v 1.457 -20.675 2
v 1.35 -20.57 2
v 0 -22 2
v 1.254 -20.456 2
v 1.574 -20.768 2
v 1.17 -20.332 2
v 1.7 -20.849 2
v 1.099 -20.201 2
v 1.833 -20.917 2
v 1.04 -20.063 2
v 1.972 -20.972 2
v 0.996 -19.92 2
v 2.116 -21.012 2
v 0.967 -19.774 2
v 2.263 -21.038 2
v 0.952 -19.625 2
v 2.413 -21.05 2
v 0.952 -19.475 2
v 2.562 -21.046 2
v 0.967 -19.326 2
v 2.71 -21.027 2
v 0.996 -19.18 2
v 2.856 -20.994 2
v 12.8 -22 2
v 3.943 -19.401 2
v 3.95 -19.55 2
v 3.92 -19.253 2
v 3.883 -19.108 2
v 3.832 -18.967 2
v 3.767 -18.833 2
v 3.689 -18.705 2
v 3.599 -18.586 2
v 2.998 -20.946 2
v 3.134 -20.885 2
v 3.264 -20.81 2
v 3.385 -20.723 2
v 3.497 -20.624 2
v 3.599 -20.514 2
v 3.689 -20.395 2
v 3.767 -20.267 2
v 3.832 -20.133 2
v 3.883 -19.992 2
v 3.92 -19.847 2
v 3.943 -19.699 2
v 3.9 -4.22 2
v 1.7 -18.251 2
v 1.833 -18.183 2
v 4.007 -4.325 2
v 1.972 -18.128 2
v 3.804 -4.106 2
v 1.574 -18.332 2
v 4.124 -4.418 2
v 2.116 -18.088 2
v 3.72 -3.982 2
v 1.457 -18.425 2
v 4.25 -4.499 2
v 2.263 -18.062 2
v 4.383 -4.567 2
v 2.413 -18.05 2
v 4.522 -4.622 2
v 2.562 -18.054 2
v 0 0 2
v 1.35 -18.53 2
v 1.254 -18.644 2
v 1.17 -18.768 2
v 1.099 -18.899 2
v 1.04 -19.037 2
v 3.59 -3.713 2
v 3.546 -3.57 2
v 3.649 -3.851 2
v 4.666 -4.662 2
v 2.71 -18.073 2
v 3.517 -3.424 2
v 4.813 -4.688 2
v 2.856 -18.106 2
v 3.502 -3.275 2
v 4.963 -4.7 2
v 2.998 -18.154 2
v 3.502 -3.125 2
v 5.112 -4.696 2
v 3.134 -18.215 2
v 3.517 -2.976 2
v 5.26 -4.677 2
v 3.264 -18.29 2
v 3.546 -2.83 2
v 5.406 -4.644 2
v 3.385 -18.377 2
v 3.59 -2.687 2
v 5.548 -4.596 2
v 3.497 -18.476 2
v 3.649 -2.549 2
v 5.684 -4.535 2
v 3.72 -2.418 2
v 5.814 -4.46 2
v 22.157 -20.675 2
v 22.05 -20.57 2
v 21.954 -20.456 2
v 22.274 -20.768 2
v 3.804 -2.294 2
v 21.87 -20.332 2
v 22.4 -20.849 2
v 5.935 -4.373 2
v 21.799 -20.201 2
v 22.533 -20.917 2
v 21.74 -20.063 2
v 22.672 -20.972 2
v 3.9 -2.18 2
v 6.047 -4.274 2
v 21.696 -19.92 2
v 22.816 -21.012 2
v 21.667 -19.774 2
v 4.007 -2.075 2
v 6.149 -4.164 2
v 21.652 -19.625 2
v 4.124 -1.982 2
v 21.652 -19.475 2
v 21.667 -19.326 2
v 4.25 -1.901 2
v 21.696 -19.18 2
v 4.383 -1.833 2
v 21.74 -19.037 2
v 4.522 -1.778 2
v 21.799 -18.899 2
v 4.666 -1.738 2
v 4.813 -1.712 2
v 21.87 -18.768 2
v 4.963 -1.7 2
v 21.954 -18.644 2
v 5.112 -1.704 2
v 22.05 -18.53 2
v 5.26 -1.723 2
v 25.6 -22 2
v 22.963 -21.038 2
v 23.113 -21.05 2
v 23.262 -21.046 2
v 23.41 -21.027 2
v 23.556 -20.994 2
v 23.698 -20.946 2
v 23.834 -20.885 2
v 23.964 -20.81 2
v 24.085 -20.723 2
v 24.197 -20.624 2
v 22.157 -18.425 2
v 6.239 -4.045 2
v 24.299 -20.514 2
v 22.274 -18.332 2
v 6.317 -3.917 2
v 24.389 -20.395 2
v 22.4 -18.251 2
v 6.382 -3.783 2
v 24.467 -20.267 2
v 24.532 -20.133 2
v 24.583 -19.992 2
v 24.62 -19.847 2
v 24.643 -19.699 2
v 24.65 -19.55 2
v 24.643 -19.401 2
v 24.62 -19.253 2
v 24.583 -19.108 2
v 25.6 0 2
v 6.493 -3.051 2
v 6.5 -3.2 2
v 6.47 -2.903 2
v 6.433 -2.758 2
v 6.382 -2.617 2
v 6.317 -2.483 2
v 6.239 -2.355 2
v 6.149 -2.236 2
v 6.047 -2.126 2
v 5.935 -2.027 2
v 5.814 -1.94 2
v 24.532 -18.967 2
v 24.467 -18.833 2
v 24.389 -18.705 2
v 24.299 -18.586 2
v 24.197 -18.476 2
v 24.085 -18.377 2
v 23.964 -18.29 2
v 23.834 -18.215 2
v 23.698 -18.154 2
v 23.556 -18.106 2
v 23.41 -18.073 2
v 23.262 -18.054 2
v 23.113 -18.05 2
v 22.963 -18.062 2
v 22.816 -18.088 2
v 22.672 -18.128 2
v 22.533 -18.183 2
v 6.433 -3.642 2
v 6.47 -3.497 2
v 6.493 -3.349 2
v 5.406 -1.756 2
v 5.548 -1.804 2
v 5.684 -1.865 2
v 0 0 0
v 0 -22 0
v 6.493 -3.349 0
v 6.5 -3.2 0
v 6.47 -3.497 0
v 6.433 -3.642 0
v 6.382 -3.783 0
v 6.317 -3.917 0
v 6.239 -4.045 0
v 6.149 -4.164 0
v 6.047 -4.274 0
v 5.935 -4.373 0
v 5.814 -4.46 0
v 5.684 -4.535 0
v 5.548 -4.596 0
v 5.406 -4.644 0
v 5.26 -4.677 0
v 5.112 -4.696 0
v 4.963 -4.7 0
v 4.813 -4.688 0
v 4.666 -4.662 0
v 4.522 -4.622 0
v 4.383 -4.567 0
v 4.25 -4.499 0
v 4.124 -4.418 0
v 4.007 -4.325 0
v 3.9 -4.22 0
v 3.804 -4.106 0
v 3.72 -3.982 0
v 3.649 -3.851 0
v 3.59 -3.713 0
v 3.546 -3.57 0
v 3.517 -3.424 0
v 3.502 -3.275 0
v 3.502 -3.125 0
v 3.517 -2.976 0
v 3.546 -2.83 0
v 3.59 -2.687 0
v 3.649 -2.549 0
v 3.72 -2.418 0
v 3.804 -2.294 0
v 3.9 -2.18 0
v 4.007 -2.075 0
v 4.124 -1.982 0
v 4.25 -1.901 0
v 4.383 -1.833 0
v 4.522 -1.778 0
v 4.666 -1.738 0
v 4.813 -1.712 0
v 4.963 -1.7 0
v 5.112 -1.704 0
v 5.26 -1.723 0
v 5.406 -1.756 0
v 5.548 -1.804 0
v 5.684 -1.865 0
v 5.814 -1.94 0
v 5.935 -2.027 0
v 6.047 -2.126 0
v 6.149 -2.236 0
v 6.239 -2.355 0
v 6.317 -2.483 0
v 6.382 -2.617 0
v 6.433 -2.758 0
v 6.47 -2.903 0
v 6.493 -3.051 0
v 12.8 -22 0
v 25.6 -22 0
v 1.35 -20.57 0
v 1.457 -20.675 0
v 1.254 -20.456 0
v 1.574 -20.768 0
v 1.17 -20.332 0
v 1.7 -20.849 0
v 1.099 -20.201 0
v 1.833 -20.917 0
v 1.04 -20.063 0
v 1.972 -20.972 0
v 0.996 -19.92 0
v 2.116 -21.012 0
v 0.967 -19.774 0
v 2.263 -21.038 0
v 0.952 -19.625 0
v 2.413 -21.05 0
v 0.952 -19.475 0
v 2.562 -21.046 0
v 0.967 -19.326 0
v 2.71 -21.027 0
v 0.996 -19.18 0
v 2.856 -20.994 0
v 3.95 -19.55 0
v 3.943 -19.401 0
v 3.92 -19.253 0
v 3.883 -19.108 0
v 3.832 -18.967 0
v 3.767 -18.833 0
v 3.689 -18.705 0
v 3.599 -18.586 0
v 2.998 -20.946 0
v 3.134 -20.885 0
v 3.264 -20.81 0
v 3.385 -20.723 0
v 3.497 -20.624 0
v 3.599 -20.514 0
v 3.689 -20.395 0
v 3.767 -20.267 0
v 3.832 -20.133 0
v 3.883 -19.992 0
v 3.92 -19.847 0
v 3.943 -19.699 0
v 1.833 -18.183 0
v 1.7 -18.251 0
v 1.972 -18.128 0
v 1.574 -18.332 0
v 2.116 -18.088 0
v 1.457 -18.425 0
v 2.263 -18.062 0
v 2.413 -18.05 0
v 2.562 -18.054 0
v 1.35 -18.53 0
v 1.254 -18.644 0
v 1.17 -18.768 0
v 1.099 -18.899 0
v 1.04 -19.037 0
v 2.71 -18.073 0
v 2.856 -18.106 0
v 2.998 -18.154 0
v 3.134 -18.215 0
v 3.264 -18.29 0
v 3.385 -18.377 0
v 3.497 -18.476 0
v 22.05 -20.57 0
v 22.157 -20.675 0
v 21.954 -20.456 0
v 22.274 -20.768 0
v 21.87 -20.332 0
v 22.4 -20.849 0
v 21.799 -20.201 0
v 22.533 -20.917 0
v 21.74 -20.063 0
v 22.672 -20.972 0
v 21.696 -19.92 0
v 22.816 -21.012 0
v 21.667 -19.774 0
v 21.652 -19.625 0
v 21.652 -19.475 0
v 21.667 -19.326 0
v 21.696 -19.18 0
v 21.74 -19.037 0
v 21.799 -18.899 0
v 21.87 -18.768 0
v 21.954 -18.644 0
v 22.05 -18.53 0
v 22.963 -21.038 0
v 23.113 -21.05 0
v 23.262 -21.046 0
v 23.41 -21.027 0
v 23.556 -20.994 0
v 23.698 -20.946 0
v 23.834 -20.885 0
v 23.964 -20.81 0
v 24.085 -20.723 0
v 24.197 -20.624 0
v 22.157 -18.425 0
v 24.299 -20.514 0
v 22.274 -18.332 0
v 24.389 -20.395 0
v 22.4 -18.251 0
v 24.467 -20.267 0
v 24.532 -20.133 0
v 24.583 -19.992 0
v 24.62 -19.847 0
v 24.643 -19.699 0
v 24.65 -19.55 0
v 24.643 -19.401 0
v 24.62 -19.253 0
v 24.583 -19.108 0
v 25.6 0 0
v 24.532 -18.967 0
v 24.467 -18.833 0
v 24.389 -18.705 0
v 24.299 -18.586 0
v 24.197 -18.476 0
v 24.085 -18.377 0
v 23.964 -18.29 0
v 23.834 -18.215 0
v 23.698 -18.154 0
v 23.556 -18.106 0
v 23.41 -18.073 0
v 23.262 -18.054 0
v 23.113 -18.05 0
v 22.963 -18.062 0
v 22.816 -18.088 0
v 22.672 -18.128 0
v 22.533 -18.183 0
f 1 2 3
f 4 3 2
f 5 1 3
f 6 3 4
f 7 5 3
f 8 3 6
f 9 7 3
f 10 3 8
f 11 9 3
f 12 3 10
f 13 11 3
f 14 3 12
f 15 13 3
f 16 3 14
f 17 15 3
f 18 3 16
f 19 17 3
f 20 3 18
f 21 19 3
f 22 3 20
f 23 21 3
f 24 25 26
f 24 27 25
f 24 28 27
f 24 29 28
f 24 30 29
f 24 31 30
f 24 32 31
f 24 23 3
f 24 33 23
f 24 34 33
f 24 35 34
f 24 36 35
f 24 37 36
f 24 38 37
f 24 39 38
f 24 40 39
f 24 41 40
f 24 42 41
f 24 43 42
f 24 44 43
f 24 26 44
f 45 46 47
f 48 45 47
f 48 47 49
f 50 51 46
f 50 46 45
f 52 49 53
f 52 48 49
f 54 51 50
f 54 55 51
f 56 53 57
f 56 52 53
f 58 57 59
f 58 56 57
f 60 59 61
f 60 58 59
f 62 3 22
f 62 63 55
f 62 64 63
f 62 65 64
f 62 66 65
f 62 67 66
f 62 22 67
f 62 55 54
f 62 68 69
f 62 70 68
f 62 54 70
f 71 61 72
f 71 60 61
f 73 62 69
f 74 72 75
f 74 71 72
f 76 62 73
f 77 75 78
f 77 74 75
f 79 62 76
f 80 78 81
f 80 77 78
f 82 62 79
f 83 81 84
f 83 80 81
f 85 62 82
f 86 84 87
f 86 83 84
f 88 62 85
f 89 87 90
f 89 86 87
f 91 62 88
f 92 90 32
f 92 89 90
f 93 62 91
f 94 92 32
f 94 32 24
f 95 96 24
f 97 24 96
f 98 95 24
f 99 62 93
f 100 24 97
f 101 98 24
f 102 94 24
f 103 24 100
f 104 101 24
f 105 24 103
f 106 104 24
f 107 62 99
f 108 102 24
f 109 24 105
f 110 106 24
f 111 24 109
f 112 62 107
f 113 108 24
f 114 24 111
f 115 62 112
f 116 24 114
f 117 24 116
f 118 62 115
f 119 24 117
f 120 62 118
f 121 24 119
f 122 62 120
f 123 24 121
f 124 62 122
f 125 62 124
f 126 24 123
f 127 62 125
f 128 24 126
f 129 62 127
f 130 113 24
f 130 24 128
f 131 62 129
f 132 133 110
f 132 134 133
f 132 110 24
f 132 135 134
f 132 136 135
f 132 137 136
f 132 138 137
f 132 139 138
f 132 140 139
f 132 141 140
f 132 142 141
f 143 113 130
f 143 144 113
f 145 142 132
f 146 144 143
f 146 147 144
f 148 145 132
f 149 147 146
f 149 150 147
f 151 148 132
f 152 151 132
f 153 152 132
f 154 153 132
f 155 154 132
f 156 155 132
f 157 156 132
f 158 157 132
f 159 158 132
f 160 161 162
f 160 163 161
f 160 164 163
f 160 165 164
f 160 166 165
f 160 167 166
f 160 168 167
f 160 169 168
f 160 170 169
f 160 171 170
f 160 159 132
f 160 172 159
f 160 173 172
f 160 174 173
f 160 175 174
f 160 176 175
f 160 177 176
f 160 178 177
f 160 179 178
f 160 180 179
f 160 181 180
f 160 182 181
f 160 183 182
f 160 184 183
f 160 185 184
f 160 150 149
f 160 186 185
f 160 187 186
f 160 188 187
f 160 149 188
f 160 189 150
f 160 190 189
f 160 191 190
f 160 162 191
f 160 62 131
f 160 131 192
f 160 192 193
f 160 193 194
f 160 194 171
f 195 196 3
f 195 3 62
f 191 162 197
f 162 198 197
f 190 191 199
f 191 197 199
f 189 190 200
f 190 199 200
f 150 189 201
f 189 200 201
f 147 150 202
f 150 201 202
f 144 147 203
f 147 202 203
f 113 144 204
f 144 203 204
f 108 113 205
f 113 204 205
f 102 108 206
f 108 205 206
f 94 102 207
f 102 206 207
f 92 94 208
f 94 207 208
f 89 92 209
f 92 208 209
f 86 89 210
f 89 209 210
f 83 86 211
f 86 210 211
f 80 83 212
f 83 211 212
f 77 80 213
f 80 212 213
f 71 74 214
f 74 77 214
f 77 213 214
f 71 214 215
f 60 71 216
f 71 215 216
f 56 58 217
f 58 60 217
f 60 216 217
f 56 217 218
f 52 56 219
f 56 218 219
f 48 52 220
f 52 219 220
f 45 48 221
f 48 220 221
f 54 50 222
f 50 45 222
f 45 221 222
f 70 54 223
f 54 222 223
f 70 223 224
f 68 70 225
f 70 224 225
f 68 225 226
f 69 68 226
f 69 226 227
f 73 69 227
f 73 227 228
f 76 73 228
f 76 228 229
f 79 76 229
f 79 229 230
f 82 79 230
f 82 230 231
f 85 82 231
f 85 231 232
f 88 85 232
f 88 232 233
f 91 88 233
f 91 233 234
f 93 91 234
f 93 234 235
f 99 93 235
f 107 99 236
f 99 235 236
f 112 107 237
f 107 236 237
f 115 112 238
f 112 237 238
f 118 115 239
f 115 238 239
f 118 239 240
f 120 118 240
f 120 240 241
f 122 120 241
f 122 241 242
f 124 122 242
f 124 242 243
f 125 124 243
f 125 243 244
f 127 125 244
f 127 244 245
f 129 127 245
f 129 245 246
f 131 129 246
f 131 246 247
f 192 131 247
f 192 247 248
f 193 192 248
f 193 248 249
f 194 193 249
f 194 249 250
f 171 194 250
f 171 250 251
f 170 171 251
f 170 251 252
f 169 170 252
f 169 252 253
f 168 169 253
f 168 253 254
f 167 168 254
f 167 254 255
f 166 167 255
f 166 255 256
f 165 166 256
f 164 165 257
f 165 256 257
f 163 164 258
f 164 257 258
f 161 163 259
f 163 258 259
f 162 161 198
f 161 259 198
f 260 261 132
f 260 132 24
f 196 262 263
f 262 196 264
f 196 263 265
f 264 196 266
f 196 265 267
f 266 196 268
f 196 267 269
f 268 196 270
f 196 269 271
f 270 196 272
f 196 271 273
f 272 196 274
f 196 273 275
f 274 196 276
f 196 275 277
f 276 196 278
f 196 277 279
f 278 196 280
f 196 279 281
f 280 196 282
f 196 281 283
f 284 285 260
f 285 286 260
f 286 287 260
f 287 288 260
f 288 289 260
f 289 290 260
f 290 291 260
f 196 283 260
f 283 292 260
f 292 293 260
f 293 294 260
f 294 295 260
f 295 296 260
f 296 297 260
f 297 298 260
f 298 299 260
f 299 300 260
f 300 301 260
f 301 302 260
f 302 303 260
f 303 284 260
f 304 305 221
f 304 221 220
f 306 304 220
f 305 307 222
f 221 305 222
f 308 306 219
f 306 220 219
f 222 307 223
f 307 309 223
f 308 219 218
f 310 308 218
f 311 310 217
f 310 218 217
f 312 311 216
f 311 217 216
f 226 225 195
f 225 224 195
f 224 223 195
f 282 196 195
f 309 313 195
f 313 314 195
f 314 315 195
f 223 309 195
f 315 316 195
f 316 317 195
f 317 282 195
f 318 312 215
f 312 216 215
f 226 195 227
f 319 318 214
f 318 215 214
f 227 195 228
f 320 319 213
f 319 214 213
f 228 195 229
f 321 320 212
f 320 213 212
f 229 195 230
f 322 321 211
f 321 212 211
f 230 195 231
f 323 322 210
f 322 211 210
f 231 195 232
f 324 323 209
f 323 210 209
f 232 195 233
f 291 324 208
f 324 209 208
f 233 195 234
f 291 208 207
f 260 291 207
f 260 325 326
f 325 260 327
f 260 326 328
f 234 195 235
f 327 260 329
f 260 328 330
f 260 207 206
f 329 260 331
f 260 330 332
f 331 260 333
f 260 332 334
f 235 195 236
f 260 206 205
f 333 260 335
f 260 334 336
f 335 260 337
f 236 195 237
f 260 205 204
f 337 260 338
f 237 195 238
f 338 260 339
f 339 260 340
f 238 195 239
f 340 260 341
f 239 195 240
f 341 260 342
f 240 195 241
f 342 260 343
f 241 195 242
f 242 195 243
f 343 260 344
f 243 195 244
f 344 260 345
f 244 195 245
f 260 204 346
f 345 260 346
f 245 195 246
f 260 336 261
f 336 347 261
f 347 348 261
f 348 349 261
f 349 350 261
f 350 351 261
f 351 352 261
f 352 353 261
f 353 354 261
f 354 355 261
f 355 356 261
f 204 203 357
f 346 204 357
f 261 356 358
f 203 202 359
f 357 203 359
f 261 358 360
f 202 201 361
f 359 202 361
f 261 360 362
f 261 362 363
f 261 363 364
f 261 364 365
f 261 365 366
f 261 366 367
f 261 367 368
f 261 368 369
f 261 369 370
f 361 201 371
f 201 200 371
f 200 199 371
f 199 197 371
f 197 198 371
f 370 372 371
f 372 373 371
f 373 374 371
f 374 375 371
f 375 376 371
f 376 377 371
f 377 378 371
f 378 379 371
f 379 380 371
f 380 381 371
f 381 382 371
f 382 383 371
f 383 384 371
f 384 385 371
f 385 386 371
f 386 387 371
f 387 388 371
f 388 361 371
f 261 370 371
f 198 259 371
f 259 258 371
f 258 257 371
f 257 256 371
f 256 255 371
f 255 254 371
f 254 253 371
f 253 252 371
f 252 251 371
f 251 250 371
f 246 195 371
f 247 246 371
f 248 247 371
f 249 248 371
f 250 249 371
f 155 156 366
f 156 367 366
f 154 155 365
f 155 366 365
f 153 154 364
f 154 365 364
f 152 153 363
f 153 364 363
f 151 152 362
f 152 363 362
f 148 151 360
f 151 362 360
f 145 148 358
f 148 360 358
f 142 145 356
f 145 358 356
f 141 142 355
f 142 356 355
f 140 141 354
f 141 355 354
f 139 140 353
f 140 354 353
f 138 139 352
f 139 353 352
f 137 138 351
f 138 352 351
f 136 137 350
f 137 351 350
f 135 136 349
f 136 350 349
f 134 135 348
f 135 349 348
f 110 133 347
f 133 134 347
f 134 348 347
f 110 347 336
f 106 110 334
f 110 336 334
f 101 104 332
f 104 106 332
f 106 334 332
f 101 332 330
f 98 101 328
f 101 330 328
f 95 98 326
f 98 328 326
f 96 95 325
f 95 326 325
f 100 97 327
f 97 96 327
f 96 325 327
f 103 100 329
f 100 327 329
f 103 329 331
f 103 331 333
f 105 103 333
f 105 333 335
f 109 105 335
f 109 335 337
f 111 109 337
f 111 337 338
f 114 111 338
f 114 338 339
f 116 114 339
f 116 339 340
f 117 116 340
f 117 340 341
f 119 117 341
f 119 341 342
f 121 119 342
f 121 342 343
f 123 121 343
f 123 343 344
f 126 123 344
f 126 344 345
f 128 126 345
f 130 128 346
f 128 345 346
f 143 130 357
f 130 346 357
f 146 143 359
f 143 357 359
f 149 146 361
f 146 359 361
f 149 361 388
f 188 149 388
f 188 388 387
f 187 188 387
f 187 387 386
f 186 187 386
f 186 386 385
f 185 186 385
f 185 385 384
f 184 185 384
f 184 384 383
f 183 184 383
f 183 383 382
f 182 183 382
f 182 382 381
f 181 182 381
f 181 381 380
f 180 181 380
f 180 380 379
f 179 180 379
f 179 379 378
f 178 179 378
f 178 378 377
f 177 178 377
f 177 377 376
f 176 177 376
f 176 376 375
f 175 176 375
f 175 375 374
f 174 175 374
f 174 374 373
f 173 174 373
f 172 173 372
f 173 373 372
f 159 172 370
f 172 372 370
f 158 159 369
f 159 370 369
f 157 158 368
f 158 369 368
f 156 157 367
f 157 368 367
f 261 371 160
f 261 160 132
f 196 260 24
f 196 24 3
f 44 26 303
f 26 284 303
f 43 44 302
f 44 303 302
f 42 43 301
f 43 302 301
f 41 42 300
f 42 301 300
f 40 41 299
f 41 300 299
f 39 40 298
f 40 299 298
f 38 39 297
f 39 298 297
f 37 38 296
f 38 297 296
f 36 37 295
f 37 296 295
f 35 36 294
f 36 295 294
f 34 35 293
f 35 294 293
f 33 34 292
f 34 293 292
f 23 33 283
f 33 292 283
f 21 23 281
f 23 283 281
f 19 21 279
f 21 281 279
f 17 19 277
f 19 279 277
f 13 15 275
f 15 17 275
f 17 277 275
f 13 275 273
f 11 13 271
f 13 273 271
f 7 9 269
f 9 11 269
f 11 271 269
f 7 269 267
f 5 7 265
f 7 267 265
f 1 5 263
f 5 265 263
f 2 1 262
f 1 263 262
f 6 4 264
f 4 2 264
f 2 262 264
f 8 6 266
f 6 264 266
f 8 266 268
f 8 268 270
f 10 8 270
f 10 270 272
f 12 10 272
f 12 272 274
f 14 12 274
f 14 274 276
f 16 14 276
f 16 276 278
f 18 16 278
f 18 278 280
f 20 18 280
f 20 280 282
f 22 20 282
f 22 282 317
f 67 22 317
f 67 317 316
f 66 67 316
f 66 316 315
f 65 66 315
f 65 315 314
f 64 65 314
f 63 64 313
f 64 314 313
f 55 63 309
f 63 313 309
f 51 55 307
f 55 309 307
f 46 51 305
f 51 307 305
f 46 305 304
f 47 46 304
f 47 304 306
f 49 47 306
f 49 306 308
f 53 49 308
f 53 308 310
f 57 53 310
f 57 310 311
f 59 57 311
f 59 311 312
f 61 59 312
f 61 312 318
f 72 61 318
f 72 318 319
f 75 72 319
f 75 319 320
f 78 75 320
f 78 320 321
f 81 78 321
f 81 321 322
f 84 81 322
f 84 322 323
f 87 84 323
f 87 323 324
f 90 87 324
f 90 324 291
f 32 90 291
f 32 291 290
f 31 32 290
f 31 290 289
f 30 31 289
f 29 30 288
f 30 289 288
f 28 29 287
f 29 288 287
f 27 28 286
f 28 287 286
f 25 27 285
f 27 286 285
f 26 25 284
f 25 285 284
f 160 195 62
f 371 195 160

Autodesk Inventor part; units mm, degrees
ref_plane "YZ Plane" through (0, 0, 0) normal (1, 0, 0) x (0, 1, 0)
ref_plane "XZ Plane" through (0, 0, 0) normal (0, 1, 0) x (-1, 0, 0)
ref_plane "XY Plane" through (0, 0, 0) normal (0, 0, 1) x (1, 0, 0)
sketch "Sketch1" plane through (0, 0, 0) normal (0, 0, 1) x (1, 0, 0)
  line L0 (0, 0) -> (25.6, 0)
  line L1 (25.6, 0) -> (25.6, -22)
  line L2 (25.6, -22) -> (0, -22)
  line L3 (0, -22) -> (0, 0)
  circle A0 centre (2.45, -19.55) radius 1.5
  line L4 (12.8, -22) -> (12.8, -20.4874)
  circle A1 centre (23.15, -19.55) radius 1.5
  circle A2 centre (5, -3.2) radius 1.5
  dimension "d0" = 25.6
  dimension "d1" = 22
  dimension "d2" = 3
  dimension "d3" = 2.45
  dimension "d4" = 2.45
  dimension "d5" = 3.2
  dimension "d6" = 3
extrude "Extrusion1" add sketch "Sketch1" along normal blind 2
properties part number "Plate_SEN_Current_sensor"
